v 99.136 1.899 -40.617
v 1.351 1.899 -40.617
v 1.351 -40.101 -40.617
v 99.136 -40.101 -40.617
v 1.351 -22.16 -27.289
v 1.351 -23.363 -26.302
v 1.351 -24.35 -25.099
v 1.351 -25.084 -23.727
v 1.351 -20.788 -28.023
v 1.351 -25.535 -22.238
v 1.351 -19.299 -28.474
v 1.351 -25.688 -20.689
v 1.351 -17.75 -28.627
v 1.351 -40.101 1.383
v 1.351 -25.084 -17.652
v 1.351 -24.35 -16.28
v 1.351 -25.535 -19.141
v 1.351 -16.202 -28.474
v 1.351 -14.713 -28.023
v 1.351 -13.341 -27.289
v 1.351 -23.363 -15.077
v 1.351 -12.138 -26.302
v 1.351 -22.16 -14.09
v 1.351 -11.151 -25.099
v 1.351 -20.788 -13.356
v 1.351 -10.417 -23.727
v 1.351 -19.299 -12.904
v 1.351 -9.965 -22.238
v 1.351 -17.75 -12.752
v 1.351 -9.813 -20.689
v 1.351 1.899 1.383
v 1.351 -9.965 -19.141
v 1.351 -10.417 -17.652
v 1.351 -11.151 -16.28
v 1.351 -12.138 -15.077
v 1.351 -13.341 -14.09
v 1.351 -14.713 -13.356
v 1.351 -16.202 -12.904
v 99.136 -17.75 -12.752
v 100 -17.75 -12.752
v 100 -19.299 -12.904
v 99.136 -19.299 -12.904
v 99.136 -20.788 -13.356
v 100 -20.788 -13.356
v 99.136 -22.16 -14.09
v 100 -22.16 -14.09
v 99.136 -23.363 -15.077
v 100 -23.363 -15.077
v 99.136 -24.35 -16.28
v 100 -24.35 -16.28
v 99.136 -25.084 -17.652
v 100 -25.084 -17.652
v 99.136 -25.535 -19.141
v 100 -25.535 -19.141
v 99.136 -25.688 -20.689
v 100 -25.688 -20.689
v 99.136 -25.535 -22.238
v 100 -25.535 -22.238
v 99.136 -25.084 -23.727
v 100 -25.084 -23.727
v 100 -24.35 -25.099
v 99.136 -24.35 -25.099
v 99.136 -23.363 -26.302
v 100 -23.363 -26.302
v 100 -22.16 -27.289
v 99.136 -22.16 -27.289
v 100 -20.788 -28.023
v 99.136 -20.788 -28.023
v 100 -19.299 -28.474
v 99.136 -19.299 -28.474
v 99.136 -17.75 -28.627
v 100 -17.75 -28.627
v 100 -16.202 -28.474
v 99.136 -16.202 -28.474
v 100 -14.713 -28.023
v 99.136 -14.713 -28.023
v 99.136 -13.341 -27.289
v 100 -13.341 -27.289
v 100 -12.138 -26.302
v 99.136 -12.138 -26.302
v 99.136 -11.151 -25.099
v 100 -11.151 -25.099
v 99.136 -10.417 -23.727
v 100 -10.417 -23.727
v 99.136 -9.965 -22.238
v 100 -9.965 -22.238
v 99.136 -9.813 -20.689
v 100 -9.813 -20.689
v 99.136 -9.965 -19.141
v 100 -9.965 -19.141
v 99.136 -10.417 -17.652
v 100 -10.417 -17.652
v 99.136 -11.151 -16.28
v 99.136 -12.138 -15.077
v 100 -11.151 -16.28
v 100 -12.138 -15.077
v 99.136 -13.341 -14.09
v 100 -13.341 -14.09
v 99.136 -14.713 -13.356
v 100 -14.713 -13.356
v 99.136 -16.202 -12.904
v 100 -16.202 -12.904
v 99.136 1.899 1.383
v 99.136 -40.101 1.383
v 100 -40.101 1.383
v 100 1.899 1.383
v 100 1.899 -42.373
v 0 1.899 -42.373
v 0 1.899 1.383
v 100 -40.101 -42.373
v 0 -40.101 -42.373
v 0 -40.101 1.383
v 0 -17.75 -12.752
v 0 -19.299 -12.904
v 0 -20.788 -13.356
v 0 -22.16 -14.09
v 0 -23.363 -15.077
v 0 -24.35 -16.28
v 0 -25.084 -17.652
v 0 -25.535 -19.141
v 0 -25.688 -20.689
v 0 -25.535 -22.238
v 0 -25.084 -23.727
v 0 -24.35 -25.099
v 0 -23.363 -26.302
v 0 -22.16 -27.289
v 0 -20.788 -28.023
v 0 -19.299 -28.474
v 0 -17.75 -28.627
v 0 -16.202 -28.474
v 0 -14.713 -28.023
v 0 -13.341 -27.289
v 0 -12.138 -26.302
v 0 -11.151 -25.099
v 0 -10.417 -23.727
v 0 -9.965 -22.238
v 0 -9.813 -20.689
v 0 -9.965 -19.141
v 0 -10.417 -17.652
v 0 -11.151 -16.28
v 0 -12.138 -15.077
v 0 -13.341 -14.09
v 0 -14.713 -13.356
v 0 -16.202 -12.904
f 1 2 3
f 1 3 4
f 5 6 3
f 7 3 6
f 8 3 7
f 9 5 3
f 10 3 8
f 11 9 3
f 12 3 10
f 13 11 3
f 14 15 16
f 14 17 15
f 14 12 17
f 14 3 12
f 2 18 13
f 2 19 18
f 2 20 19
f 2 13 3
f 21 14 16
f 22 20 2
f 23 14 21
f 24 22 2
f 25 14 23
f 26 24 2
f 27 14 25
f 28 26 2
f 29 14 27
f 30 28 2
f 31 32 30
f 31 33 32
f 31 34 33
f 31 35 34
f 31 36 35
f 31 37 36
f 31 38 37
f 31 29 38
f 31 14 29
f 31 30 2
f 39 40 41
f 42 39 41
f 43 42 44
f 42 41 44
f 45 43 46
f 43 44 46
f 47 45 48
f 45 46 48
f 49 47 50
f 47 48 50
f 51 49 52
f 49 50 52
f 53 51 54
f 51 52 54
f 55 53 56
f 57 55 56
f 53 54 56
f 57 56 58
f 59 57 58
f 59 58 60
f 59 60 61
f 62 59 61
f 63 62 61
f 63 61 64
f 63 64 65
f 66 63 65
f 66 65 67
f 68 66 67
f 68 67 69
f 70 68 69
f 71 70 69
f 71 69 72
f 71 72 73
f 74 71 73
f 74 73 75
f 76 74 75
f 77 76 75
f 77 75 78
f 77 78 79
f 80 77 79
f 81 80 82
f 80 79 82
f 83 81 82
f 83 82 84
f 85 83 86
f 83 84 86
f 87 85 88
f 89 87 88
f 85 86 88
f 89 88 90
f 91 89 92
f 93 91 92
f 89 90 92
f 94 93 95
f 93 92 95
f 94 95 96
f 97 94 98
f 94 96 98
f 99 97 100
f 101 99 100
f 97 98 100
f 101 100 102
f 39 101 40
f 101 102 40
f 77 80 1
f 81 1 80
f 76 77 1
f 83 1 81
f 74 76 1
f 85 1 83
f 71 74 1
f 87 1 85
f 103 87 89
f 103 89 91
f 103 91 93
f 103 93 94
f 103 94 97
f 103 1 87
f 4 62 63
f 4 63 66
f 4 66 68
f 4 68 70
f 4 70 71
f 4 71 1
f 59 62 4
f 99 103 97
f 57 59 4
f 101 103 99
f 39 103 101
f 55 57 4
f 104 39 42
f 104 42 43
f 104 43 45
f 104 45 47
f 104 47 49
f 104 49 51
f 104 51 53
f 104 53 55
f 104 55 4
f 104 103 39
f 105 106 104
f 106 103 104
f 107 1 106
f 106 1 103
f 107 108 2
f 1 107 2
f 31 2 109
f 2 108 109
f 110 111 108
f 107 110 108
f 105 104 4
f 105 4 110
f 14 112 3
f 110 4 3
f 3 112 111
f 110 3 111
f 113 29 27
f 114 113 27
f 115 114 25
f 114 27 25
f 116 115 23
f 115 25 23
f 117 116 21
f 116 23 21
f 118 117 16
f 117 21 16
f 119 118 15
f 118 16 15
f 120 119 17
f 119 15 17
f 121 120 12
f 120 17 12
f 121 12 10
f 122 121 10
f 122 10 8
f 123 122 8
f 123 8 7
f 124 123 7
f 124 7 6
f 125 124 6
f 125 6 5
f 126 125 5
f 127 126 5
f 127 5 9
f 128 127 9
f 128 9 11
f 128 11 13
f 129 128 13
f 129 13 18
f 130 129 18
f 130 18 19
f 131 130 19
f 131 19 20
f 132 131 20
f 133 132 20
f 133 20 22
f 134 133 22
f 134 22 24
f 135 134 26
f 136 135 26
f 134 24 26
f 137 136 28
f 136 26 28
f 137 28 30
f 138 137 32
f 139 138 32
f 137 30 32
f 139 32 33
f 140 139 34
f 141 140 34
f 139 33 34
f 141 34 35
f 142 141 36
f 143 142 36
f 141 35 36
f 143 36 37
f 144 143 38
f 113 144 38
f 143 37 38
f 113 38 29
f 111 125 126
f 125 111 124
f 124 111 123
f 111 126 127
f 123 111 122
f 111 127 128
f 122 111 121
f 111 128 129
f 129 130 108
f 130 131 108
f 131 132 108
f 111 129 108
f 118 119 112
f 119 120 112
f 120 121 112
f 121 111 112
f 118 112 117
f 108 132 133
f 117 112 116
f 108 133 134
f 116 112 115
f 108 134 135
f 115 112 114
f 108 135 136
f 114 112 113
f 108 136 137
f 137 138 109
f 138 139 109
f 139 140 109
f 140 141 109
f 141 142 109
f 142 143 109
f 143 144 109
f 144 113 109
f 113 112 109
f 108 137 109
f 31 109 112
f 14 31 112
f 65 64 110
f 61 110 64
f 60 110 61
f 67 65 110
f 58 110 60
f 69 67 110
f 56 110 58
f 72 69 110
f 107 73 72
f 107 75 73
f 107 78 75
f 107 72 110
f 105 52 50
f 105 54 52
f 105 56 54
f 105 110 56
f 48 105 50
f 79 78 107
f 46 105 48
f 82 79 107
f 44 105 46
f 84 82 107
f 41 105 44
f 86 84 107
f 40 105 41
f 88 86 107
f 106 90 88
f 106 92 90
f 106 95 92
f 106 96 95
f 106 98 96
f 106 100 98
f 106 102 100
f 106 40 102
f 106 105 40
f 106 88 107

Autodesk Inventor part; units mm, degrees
ref_plane "YZ Plane" through (0, 0, 0) normal (1, 0, 0) x (0, 1, 0)
ref_plane "XZ Plane" through (0, 0, 0) normal (0, 1, 0) x (-1, 0, 0)
ref_plane "XY Plane" through (0, 0, 0) normal (0, 0, 1) x (1, 0, 0)
sketch "Sketch1" plane through (0, 0, 0) normal (1, 0, 0) x (0, 1, 0)
  line L0 (1.8986, 1.3831) -> (-40.1014, 1.3831)
  line L1 (-40.1014, 1.3831) -> (-40.1014, -42.3731)
  line L2 (-40.1014, -42.3731) -> (1.8986, -42.3731)
  line L3 (1.8986, -42.3731) -> (1.8986, 1.3831)
  point P0 (0, 0)
  dimension "d0" = 42
extrude "Extrusion1" add sketch "Sketch1" along normal blind 100
sketch "Sketch3" plane through (0, 0, 0) normal (-1, 0, 0) x (0, 0, 1)
  point P0 (0, 0)
sketch "Sketch8" plane through (0, 0, 0) normal (-1, 0, 0) x (0, 0, 1)
  point P0 (0, 0)
  point P1 (-20.6894, -17.7504)
hole "Hole4" at (0, -17.7504, -20.6894) direction (1, 0, 0) diameter 15.875 end through all
sketch "Sketch9" plane through (0, -40.1014, 1.3831) normal (0, 0, 1) x (1, 0, 0)
  line L0 (0, 42) -> (100, 42) projected
  line L1 (0, 0) -> (100, 0) projected
  line L2 (1.351, 42) -> (99.1356, 42)
  line L3 (99.1356, 42) -> (99.1356, 0)
  line L4 (99.1356, 0) -> (1.351, 0)
  line L5 (1.351, 0) -> (1.351, 42)
  point P0 (0, 40.1014)
  point P1 (1.351, 0)
extrude "Extrusion4" cut sketch "Sketch9" against normal blind 42
properties part number "clamp 2"
